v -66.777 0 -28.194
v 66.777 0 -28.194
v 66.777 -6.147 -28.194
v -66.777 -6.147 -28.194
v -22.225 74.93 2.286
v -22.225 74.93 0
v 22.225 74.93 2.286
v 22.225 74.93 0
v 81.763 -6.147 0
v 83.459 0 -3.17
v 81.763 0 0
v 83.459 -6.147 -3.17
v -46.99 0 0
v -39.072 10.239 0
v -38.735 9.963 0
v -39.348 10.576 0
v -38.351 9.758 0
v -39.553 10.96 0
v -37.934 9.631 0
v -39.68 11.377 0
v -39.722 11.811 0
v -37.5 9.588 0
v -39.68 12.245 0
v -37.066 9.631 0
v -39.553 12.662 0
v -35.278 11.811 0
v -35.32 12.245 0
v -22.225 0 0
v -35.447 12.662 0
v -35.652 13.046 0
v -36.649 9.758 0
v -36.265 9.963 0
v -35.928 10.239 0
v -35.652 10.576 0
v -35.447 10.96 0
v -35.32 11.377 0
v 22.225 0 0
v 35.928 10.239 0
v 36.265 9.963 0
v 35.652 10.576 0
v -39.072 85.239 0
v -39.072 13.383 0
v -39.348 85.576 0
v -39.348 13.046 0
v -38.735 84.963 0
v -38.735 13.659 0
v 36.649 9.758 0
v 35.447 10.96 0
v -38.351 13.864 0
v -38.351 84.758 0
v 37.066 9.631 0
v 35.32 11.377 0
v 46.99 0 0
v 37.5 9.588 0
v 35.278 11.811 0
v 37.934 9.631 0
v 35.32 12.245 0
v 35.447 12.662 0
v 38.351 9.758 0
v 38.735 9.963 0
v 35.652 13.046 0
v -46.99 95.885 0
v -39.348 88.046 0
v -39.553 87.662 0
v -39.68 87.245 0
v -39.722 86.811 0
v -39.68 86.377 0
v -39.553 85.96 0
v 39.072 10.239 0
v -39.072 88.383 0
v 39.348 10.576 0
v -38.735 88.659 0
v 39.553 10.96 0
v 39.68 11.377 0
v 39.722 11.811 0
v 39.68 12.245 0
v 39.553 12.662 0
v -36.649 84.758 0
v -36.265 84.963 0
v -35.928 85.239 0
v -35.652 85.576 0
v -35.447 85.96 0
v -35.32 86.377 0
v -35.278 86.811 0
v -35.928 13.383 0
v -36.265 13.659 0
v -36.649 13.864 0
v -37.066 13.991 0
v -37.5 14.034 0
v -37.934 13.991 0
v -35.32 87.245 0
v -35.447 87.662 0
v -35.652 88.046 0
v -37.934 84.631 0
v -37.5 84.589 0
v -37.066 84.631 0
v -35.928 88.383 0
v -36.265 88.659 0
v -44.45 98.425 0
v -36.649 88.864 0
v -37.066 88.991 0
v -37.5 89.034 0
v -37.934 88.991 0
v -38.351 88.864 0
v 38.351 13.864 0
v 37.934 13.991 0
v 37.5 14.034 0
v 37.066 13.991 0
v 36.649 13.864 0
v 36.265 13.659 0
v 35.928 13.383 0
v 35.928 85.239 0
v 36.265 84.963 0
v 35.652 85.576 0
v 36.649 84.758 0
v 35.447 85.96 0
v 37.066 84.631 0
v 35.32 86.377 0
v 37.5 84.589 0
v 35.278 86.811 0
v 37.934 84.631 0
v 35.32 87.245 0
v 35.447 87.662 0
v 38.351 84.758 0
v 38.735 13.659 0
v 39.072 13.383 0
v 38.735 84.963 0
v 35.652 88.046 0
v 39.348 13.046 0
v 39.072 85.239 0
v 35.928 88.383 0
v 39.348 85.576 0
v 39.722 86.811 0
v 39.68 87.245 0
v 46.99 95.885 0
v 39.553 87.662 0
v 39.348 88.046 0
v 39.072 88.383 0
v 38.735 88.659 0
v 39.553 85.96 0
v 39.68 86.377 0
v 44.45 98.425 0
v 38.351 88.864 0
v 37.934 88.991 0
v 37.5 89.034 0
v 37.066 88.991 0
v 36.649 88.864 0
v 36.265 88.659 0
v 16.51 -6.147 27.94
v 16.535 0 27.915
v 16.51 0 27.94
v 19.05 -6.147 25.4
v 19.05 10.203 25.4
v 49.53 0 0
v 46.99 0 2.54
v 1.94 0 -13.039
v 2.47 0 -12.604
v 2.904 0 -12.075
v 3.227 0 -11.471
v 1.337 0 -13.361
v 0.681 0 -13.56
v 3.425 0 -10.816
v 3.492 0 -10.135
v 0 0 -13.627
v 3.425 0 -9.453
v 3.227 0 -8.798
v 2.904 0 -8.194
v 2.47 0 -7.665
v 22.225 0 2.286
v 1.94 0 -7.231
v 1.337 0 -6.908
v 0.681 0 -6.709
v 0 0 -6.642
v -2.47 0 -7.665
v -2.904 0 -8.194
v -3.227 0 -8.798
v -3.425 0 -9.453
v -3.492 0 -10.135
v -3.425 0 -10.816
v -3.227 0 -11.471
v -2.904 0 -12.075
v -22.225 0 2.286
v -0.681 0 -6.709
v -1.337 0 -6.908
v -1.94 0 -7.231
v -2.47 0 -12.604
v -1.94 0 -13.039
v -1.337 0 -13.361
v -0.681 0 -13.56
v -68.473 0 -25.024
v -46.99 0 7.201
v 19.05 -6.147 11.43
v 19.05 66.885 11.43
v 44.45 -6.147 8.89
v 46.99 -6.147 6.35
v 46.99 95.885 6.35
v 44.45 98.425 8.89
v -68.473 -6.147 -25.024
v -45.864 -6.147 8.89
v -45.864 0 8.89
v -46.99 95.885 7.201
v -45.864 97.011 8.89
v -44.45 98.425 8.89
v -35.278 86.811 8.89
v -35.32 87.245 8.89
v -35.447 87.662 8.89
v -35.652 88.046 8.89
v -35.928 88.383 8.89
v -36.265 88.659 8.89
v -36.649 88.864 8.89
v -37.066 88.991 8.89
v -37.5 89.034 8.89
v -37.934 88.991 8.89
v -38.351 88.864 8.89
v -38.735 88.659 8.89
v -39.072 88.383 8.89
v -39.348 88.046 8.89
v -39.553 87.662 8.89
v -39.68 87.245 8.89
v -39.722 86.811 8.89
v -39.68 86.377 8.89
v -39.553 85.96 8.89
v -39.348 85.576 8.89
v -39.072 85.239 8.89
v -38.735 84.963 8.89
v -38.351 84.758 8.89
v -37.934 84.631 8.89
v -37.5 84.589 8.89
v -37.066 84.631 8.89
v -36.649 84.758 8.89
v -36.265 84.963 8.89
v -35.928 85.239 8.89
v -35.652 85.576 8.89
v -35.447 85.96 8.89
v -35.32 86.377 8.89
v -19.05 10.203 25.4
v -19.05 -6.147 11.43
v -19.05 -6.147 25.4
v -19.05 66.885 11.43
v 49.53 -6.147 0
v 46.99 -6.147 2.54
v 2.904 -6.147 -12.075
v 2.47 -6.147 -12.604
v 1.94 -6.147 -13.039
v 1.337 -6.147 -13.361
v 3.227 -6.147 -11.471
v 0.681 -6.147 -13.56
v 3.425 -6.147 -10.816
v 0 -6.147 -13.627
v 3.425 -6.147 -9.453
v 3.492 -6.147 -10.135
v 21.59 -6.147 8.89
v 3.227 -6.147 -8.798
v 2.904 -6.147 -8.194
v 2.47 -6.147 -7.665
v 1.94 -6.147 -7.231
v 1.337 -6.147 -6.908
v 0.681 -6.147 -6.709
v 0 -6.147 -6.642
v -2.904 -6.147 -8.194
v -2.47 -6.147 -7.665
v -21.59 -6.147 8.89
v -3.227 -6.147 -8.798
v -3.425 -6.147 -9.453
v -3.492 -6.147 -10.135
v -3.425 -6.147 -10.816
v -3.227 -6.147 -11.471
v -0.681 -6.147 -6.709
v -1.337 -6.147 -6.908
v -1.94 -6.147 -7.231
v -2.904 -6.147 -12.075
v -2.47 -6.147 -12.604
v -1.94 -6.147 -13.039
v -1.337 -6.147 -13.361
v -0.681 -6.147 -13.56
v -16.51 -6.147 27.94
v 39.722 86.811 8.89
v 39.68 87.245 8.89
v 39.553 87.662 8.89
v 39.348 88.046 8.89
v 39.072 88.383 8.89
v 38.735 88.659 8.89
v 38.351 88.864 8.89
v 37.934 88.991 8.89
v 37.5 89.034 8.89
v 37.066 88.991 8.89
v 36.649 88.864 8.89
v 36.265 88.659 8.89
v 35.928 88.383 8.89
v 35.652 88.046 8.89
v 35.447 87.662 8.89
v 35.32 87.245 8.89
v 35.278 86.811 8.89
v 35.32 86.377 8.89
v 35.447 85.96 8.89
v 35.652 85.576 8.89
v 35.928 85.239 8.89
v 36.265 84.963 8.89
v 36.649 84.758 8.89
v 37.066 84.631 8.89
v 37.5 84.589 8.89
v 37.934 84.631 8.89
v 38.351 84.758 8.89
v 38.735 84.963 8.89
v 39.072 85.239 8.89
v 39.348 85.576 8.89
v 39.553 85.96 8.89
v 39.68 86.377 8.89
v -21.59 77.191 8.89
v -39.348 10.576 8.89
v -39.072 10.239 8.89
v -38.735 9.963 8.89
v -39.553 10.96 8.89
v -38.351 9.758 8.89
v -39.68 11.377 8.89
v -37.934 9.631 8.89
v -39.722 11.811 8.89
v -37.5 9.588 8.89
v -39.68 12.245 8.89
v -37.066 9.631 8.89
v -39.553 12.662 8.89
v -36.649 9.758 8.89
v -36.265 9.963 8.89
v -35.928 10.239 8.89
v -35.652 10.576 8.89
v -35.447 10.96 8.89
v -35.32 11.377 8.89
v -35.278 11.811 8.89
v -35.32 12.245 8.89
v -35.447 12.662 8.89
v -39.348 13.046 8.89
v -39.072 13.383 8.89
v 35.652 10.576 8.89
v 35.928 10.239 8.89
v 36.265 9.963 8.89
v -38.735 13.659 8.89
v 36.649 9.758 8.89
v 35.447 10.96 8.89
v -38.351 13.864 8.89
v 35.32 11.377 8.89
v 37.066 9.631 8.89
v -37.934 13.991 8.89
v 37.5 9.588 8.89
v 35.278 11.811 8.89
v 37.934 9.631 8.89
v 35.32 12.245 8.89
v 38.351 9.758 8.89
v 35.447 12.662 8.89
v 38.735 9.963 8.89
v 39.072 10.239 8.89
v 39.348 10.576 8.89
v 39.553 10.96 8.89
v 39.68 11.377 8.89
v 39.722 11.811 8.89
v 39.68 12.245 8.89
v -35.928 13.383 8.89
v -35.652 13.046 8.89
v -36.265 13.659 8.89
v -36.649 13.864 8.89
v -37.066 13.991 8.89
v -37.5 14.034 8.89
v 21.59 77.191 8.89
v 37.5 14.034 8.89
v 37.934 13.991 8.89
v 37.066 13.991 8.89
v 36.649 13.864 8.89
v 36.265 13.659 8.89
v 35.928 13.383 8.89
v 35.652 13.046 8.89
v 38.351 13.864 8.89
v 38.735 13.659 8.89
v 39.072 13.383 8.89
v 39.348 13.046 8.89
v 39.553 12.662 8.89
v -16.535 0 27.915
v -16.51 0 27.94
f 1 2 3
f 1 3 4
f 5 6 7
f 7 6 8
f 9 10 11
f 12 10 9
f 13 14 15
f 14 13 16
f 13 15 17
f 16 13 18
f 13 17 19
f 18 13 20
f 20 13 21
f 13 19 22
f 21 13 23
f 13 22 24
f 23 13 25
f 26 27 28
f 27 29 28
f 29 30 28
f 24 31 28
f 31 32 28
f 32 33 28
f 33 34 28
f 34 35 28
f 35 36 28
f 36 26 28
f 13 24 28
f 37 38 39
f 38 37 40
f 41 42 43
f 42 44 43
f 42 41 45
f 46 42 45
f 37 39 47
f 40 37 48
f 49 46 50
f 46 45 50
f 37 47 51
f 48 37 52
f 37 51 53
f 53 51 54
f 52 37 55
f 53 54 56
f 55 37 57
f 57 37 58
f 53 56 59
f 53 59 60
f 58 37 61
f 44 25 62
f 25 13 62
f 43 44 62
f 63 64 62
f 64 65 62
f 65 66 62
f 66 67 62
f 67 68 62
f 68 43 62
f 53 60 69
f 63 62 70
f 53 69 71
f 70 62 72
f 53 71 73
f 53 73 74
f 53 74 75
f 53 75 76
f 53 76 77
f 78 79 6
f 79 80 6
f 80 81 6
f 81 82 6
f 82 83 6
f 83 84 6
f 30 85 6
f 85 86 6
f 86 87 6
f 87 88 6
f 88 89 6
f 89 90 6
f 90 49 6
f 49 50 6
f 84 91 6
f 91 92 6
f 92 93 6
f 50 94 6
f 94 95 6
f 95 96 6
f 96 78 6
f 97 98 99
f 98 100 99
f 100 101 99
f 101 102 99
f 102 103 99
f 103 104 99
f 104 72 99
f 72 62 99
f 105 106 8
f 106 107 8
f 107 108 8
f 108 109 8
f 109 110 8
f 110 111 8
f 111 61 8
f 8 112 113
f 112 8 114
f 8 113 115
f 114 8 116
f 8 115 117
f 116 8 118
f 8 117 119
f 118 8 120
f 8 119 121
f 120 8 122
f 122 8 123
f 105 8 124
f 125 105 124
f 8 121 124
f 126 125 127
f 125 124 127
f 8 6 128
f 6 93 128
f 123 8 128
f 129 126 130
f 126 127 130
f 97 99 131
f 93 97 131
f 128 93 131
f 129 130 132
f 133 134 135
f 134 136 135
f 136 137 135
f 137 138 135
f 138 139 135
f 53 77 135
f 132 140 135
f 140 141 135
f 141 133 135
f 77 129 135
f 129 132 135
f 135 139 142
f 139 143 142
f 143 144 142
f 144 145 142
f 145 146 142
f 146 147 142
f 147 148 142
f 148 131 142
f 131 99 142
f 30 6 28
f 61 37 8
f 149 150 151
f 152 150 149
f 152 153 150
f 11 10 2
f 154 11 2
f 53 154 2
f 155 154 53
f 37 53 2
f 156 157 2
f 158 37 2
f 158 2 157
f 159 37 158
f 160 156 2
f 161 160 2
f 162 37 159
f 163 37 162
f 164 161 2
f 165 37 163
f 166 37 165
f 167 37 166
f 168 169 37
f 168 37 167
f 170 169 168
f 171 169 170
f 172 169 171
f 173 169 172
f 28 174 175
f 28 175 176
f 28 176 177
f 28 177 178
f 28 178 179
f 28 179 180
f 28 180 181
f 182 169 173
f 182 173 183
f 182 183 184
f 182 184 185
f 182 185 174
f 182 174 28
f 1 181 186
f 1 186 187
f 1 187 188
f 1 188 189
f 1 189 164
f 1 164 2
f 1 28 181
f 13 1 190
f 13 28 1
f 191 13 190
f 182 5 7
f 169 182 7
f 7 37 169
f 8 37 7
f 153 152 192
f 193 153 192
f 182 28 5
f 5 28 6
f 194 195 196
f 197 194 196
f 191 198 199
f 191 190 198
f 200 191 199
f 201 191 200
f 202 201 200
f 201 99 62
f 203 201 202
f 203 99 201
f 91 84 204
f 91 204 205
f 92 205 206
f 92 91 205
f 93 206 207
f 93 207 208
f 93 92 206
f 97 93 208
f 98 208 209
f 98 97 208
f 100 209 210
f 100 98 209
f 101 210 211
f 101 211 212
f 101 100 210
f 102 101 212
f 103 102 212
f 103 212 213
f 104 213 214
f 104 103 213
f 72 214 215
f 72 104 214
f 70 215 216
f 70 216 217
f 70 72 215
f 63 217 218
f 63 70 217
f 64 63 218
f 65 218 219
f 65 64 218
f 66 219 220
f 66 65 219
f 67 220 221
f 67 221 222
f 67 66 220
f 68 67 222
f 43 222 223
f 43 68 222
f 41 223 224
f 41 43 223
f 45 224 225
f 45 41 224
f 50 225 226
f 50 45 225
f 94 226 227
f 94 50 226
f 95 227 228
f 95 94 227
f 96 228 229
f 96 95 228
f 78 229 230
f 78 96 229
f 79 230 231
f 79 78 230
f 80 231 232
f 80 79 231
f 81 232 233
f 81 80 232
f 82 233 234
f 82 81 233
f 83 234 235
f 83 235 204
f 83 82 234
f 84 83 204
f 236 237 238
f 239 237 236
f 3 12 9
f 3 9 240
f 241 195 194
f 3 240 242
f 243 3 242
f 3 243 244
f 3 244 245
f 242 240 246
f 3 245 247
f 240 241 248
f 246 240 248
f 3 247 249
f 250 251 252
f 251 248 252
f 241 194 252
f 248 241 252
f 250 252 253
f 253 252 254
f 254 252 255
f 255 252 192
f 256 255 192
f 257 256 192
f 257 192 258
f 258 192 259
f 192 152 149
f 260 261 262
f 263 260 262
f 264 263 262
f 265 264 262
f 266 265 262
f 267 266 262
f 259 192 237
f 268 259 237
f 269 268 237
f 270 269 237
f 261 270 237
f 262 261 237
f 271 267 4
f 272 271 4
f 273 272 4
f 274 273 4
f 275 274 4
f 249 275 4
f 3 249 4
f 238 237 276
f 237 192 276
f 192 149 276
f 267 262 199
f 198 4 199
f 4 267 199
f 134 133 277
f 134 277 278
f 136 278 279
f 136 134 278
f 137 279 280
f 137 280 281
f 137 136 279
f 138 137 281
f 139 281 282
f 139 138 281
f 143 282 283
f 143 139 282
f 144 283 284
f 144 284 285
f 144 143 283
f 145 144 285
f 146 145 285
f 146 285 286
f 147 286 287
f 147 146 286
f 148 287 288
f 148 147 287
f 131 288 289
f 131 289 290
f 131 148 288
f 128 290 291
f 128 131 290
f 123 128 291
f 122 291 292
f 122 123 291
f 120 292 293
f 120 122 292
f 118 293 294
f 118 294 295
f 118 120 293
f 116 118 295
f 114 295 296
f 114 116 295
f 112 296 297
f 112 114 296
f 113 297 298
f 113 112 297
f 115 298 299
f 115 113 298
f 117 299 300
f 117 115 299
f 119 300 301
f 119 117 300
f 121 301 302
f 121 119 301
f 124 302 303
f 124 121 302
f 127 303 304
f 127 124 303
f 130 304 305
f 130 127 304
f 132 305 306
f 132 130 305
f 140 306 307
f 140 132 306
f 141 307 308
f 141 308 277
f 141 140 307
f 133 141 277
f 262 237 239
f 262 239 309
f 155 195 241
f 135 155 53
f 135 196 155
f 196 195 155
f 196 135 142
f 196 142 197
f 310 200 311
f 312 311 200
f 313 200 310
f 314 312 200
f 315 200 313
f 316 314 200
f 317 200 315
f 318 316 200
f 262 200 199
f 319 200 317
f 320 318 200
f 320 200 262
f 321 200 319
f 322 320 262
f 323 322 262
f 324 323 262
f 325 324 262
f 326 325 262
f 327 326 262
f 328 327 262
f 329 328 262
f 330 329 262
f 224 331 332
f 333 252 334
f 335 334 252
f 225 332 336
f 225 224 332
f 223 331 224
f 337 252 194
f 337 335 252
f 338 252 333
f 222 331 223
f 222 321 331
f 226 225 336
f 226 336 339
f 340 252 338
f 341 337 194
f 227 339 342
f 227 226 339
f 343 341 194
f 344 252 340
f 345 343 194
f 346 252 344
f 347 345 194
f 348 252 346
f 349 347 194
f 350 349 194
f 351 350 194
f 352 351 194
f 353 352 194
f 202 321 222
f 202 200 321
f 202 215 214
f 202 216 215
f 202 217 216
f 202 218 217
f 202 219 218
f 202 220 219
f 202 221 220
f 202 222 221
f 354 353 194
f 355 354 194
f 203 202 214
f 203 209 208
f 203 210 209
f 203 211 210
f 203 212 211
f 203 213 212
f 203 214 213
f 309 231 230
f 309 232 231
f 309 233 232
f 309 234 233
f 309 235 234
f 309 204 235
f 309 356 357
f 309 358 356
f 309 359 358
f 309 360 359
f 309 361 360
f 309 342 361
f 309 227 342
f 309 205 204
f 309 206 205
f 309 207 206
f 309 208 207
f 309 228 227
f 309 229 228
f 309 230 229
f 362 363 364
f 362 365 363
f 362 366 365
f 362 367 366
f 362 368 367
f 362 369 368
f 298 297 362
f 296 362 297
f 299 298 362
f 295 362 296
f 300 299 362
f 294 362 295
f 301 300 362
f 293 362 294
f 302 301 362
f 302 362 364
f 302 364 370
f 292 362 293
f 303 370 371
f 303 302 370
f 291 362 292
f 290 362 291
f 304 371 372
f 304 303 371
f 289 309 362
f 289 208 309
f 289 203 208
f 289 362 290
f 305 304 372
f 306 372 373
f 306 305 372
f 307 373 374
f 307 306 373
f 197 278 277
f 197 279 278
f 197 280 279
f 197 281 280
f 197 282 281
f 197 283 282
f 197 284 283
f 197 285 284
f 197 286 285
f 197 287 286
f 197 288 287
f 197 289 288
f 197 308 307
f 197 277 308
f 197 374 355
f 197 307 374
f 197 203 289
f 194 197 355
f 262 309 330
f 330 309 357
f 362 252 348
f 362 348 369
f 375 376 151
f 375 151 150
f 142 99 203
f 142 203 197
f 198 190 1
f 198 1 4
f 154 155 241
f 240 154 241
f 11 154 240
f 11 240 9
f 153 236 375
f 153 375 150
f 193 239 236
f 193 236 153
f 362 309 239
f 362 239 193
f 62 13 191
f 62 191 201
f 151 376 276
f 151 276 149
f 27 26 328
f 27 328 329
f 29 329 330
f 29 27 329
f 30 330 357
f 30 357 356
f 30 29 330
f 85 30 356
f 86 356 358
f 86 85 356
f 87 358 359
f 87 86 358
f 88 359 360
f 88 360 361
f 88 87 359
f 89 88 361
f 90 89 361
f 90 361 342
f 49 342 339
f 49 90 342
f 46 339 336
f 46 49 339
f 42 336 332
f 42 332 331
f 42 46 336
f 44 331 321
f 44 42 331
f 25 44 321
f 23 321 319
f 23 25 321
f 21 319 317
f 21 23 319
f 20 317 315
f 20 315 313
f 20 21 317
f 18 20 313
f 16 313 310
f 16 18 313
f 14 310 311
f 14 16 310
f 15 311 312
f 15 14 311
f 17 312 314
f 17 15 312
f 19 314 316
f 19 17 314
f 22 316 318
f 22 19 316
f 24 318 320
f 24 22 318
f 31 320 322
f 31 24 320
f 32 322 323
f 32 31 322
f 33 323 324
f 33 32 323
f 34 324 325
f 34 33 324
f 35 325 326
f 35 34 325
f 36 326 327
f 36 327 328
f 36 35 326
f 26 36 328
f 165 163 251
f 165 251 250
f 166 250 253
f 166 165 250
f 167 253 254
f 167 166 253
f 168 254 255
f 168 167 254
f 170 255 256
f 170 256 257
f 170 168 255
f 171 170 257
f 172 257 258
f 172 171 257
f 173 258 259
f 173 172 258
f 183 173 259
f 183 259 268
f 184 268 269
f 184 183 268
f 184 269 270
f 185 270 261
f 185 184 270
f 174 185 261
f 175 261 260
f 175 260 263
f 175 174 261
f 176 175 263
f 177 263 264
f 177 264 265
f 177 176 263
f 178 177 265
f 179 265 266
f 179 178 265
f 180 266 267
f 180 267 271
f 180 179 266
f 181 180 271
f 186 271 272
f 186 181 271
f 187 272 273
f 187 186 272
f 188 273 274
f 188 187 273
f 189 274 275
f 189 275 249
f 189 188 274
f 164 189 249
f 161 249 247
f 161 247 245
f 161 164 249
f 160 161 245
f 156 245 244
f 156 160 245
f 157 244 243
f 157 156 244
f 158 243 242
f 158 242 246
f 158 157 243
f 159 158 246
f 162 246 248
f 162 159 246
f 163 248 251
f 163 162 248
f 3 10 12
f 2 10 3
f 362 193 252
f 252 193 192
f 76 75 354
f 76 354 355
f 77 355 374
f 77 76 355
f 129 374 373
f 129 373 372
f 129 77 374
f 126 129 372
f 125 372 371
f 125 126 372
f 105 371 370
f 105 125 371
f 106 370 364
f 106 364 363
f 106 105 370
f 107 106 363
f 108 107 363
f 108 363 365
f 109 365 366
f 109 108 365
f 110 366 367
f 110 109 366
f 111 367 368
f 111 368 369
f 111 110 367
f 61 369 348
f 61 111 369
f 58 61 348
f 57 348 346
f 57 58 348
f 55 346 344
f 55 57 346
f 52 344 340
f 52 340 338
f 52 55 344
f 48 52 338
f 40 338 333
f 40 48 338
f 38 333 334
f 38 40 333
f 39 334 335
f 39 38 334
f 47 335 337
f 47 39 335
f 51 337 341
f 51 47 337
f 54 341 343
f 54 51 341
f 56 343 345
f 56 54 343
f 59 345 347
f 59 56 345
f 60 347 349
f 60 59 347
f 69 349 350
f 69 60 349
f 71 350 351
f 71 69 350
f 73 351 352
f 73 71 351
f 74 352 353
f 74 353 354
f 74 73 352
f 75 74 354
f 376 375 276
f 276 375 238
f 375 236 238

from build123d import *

# Parameters (mm, degrees)
SKETCH_W         = 93.98
SKETCH_H         = 98.425
SKETCH_R         = 2.2225
PAD_DEPTH        = 8.89
SKETCH001_W      = 44.45
SKETCH001_H      = 74.93
POCKET_DEPTH     = 2.286
SKETCH002_R      = 3.4925
PAD001_DEPTH     = 6.147
POCKET001_DEPTH  = 98.426
CHAMFER_SIZE     = 3.81
CHAMFER001_SIZE2 = 77.1906
CHAMFER001_SIZE  = 19.0246
CHAMFER002_SIZE  = 2.54


with BuildPart() as part:
    # Sketch → Pad (new body)
    with BuildSketch(Plane.XY):
        with Locations((0, 49.2125)):
            Rectangle(SKETCH_W, SKETCH_H)
        with Locations((37.5, 86.811)):
            Circle(SKETCH_R, mode=Mode.SUBTRACT)
        with Locations((-37.5, 86.811)):
            Circle(SKETCH_R, mode=Mode.SUBTRACT)
        with Locations((-37.5, 11.811)):
            Circle(SKETCH_R, mode=Mode.SUBTRACT)
        with Locations((37.5, 11.811)):
            Circle(SKETCH_R, mode=Mode.SUBTRACT)
    extrude(amount=PAD_DEPTH)

    # Sketch001 → Pocket (cut)
    with BuildSketch(Plane.XY):
        with Locations((0, 37.465)):
            Rectangle(SKETCH001_W, SKETCH001_H)
    extrude(amount=POCKET_DEPTH, mode=Mode.SUBTRACT)

    # Sketch002 → Pad001 (join)
    with BuildSketch(Plane.XZ):
        Polygon((-19.05, 8.89), (-19.05, 27.94), (19.05, 27.94), (19.05, 8.89), (46.99, 8.89), (46.99, 0), (85.572552, 0), (66.7766, -28.194), (-70.5866, -28.194), (-45.863996, 8.89), align=None)
        with Locations((0, -10.1346)):
            Circle(SKETCH002_R, mode=Mode.SUBTRACT)
    extrude(amount=PAD001_DEPTH)

    # Sketch003 → Pocket001 (cut, through all)
    with BuildSketch(Plane.XZ):
        Polygon((-45.863996, 8.89), (-45.863996, 18.360811), (-55.502193, 18.360811), (-55.502193, -5.567332), align=None)
    extrude(amount=-POCKET001_DEPTH, mode=Mode.SUBTRACT)

    # Chamfer
    chamfer_edges = [part.edges().sort_by_distance(p)[0] for p in [
        (-70.5866, -3.0735, -28.194),
        (85.572552, -3.0735, 0),
    ]]
    chamfer(chamfer_edges, length=CHAMFER_SIZE)

    # Chamfer001
    chamfer001_edges = [part.edges().sort_by_distance(p)[0] for p in [
        (0, 0, 8.89),
    ]]
    chamfer001_side = part.faces().sort_by_distance((0, 0, 18.415))[0]
    chamfer(chamfer001_edges, length=CHAMFER001_SIZE, length2=CHAMFER001_SIZE2, reference=chamfer001_side)

    # Chamfer002
    chamfer002_edges = [part.edges().sort_by_distance(p)[0] for p in [
        (-19.05, 38.5953, 8.89),
        (-19.05, -3.0735, 8.89),
        (-46.99, 98.425, 3.600495),
        (46.99, 98.425, 4.445),
        (19.05, -3.0735, 8.89),
        (19.05, 38.5953, 8.89),
        (19.05, -3.0735, 27.94),
        (-19.05, -3.0735, 27.94),
        (46.99, 46.139, 8.89),
        (46.99, -3.0735, 0),
    ]]
    chamfer(chamfer002_edges, length=CHAMFER002_SIZE)


solid = part.part
